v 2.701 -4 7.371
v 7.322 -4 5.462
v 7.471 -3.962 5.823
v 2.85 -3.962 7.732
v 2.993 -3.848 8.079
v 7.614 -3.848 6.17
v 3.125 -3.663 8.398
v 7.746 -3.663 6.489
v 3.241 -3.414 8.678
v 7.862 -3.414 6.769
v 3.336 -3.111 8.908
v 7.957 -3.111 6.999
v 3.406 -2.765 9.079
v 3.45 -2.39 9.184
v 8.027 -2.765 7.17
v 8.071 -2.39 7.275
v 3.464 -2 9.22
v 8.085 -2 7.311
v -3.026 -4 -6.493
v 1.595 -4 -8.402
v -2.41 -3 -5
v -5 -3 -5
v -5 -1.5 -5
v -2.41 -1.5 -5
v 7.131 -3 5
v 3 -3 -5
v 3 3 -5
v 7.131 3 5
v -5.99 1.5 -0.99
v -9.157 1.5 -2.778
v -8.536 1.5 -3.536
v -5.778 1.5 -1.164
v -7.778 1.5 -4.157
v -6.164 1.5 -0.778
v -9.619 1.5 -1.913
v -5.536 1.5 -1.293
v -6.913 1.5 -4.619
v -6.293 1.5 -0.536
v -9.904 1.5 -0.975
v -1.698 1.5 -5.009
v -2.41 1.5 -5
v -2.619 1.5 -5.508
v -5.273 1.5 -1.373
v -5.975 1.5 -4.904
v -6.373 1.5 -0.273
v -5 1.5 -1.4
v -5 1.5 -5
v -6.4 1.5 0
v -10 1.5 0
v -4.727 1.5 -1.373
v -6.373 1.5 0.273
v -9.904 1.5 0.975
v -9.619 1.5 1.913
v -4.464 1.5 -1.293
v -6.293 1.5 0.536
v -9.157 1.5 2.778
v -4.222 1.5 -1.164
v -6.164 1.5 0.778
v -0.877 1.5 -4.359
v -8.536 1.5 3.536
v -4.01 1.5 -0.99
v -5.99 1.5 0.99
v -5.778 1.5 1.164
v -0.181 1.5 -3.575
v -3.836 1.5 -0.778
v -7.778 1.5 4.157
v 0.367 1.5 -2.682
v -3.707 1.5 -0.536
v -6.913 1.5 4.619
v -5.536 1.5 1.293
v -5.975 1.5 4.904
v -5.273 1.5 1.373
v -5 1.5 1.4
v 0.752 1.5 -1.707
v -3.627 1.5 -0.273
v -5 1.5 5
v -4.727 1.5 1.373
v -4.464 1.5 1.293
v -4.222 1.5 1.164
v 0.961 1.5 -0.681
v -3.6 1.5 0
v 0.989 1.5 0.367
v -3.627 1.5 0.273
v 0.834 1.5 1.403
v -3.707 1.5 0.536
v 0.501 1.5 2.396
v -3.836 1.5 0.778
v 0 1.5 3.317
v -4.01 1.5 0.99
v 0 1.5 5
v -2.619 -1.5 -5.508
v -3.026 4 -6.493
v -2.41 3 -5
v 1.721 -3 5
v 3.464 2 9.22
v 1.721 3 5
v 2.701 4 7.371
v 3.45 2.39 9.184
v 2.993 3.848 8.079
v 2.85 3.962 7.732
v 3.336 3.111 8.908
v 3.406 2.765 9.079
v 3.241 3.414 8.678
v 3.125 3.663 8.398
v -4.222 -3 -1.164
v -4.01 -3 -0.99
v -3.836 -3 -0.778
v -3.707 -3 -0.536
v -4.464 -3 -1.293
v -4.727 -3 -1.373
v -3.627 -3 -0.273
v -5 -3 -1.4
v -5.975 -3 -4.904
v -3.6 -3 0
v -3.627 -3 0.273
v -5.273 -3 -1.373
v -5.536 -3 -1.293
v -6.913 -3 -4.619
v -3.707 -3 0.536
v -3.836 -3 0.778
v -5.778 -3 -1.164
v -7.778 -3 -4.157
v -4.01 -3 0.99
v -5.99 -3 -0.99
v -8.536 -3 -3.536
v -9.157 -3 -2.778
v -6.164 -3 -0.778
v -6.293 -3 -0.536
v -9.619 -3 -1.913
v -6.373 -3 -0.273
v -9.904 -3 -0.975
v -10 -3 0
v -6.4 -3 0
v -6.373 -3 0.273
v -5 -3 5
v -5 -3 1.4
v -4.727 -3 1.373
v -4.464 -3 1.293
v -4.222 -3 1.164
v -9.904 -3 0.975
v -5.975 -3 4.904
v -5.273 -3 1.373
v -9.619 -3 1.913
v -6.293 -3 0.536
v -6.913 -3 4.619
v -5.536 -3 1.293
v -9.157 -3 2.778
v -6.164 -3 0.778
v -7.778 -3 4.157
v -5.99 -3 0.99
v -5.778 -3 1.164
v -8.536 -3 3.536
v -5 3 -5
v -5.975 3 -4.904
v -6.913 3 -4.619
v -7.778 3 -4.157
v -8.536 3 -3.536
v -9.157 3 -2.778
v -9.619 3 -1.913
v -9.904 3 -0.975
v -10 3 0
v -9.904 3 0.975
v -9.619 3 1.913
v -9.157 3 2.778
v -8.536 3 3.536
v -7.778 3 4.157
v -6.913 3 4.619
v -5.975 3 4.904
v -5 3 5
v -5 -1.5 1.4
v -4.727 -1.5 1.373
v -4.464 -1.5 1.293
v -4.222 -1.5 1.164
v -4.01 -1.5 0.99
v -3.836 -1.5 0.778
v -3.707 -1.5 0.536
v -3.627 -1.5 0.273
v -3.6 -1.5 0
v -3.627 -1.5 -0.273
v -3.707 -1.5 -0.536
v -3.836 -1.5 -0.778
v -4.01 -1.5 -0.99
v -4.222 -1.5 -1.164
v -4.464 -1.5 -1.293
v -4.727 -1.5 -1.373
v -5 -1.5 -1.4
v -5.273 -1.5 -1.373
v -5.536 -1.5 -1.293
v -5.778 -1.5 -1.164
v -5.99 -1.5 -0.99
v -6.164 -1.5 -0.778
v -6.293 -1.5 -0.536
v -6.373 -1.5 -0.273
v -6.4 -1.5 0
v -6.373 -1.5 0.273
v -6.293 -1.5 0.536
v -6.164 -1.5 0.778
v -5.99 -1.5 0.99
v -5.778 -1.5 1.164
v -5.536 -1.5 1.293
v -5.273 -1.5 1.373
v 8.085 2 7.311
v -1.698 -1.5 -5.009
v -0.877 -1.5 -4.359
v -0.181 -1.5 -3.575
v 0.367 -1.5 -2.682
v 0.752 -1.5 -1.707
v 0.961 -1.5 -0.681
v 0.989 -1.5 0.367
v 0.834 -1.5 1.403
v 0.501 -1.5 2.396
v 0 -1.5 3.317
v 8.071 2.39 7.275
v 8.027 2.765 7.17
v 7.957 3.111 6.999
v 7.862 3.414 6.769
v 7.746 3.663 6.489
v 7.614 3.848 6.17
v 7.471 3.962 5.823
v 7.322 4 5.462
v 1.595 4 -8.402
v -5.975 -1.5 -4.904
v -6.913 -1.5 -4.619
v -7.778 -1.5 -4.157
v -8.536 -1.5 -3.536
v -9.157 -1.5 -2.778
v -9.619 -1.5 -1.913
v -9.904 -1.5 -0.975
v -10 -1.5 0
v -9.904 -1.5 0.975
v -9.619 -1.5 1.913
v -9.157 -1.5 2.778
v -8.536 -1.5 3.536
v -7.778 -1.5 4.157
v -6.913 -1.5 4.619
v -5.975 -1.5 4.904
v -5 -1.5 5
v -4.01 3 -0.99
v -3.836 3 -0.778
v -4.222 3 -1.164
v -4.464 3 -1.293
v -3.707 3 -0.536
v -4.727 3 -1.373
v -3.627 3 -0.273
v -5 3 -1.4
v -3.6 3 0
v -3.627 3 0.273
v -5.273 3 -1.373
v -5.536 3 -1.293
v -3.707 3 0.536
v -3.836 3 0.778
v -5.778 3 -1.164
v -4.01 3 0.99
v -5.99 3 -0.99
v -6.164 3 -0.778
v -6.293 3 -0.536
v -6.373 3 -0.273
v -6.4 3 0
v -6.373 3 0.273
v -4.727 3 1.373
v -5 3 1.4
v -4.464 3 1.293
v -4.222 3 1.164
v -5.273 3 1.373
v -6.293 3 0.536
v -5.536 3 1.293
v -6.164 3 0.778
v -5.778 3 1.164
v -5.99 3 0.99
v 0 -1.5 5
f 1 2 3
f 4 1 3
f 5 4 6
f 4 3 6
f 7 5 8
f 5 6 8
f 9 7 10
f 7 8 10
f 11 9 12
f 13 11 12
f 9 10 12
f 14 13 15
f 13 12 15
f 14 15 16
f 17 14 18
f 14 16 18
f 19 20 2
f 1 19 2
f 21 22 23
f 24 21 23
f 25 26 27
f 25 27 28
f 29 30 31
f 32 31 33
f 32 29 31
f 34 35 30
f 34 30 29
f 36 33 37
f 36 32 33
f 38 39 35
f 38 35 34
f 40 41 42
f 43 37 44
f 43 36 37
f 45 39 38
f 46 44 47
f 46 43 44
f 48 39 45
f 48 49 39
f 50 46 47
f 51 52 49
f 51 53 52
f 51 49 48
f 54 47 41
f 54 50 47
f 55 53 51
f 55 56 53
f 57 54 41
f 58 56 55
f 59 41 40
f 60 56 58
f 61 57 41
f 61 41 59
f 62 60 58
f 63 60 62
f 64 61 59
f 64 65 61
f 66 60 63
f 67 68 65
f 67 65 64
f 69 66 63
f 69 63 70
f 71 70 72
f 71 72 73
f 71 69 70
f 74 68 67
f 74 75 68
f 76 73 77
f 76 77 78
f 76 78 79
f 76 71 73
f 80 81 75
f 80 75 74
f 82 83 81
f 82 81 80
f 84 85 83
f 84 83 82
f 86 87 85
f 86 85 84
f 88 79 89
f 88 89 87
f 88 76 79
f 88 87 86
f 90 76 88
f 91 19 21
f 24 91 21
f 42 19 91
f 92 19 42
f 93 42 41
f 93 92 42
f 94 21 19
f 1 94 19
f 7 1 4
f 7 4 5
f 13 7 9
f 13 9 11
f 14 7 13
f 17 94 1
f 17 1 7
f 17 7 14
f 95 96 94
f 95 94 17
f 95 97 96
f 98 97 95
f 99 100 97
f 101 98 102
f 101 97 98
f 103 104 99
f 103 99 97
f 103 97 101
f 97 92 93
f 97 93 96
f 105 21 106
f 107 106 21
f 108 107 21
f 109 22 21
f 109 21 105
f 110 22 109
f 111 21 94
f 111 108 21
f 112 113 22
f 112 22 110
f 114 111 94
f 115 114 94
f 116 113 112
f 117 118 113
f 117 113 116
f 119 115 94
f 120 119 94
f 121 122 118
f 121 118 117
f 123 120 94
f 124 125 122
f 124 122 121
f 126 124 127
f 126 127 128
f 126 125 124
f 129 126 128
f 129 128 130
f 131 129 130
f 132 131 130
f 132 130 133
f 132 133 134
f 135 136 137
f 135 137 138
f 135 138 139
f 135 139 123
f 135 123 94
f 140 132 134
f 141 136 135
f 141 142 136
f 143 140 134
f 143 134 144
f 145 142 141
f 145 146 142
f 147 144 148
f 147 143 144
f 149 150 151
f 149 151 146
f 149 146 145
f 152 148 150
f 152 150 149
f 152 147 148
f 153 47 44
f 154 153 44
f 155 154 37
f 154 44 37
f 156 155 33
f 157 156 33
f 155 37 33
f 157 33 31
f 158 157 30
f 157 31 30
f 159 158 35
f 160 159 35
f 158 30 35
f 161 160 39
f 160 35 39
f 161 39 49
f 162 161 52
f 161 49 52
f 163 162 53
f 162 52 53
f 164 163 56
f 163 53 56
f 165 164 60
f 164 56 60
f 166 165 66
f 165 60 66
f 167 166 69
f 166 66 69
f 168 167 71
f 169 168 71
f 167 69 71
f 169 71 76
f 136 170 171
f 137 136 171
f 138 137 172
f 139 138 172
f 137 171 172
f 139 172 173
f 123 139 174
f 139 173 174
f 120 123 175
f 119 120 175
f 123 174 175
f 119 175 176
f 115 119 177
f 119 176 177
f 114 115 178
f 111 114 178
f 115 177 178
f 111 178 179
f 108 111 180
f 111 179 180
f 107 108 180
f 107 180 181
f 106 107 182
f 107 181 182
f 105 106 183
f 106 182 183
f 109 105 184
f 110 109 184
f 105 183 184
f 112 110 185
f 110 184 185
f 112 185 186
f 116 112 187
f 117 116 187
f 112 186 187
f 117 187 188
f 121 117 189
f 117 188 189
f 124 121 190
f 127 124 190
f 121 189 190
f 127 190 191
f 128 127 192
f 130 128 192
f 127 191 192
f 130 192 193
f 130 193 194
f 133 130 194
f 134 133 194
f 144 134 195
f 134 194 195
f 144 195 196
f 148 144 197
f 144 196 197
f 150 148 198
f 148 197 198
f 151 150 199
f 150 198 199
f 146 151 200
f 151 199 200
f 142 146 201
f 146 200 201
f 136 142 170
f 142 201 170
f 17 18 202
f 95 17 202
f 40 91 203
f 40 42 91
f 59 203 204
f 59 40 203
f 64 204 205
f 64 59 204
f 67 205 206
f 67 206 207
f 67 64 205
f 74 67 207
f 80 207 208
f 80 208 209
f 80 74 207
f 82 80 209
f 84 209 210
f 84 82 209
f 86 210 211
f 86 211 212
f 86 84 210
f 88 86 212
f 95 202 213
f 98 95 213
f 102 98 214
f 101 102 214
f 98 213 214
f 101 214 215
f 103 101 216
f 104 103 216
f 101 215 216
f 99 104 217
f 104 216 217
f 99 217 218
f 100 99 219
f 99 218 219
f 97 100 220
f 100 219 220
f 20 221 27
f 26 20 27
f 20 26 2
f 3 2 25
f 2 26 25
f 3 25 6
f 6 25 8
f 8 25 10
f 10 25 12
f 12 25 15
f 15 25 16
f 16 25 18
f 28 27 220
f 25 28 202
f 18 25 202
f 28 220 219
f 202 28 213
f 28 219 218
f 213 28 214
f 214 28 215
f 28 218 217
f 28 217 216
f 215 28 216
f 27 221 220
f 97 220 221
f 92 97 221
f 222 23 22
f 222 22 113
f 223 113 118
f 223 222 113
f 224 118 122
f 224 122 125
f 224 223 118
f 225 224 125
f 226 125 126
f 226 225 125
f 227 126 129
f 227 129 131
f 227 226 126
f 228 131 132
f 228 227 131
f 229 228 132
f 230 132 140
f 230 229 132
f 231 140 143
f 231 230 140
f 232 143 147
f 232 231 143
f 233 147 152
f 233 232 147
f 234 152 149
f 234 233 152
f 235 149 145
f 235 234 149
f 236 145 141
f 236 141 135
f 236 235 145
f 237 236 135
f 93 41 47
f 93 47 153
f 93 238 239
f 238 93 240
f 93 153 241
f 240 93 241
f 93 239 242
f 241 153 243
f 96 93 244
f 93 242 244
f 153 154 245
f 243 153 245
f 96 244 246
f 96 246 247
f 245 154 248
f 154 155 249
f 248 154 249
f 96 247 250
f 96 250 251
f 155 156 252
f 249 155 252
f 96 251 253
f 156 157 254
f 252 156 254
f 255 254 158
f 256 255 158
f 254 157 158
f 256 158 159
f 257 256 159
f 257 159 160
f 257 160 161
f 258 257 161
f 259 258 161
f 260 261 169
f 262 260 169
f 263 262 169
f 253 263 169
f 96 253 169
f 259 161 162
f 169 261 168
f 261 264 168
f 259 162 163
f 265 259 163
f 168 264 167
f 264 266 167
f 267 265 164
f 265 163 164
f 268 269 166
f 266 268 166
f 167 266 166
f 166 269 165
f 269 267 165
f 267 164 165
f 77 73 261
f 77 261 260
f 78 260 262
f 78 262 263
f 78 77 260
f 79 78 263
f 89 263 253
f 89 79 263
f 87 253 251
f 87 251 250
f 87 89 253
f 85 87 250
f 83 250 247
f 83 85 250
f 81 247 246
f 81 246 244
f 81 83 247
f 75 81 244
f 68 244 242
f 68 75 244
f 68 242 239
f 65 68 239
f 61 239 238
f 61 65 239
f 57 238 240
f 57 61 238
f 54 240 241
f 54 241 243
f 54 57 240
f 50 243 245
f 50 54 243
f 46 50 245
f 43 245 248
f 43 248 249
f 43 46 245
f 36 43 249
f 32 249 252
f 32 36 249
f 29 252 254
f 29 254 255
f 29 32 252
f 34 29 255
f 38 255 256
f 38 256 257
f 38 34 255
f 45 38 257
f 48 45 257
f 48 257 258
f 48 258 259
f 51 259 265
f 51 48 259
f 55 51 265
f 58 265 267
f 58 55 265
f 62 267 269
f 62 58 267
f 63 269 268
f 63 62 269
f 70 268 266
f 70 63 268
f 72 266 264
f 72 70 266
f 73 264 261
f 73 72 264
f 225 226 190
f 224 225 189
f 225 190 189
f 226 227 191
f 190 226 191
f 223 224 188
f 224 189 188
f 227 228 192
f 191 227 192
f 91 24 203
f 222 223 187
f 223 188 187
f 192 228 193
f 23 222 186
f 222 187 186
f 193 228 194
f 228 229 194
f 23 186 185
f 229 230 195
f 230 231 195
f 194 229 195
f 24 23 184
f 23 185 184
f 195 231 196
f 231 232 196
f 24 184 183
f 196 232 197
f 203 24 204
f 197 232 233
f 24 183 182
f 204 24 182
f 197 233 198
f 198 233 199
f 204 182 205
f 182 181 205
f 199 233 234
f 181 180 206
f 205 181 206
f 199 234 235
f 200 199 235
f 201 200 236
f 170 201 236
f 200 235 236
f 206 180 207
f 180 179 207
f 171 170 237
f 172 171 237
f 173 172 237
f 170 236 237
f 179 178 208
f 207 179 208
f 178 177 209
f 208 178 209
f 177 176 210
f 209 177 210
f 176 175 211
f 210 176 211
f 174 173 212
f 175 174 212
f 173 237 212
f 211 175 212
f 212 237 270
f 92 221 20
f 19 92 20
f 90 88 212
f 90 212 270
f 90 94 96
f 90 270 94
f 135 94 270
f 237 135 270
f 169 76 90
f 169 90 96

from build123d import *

# Parameters (mm, degrees)
BOSS_EXTRUDE1_DEPTH          = 5
SKETCH2_R                    = 5
SKETCH2_R_2                  = 1.4
BOSS_EXTRUDE2_DEPTH          = 1.5
BOSS_EXTRUDE3_REACH          = 13.576
SKETCH4_W                    = 10
SKETCH4_H                    = 1.5
SKETCH6_R                    = 5
SKETCH6_R_2                  = 1.4
BOSS_EXTRUDE4_DEPTH          = 1.5
BOSS_EXTRUDE5_REACH          = 13.576
SKETCH5_W                    = 10
SKETCH5_H                    = 1.5
SCHIZZO1_W                   = 10
SCHIZZO1_H                   = 6
ESTRUSIONE_ESTRUSIONE2_DEPTH = 11
TAGLIO_ESTRUSIONE1_DEPTH     = 11
ESTRUSIONE_ESTRUSIONE3_DEPTH = 5
SCHIZZO4_R                   = 6
TAGLIO_ESTRUSIONE2_DEPTH     = 3


with BuildPart() as part:
    # Sketch1 → Boss-Extrude1 (new, symmetric)
    with BuildSketch(Plane.XY):
        with BuildLine():
            Line((0, 3), (0, 1.5))
            ThreePointArc((0, 1.5), (1.5, 0), (0, -1.5))
            Line((0, -1.5), (0, -3))
            ThreePointArc((0, -3), (3, 0), (0, 3))
        make_face()
    extrude(amount=BOSS_EXTRUDE1_DEPTH, both=True)


with BuildPart() as body_2:
    # Sketch2 → Boss-Extrude2 (new body)
    with BuildSketch(Plane(origin=(0, 1.5, 0), x_dir=(1, 0, 0), z_dir=(0, 1, 0))):
        with Locations(Location((-5, 0, 0), (0, 0, 270))):
            Circle(SKETCH2_R)
        with Locations(Location((-5, 0, 0), (0, 0, 270))):
            Circle(SKETCH2_R_2, mode=Mode.SUBTRACT)
    extrude(amount=BOSS_EXTRUDE2_DEPTH)

    # Sketch4 → Boss-Extrude3 (add, up to next)
    with BuildSketch(Plane.ZY, mode=Mode.PRIVATE) as boss_extrude3_sk1:
        with Locations((0, 2.25)):
            Rectangle(SKETCH4_W, SKETCH4_H)
    boss_extrude3_tool1 = extrude(boss_extrude3_sk1.sketch, amount=BOSS_EXTRUDE3_REACH, mode=Mode.PRIVATE) - body_2.part

    add(part.part)  # Boss-Extrude3 merges part
    add(boss_extrude3_tool1.solids().sort_by_distance((0, 2.25, 0))[0])
    add(boss_extrude3_tool1.solids().sort_by_distance((0, 2.25, 0))[1])


with BuildPart() as body_2_2:
    # Sketch6 → Boss-Extrude4 (new body)
    with BuildSketch(Plane(origin=(0, -1.5, 0), x_dir=(1, 0, 0), z_dir=(0, 1, 0))):
        with Locations(Location((-5, 0, 0), (0, 0, 270))):
            Circle(SKETCH6_R)
        with Locations(Location((-5, 0, 0), (0, 0, 270))):
            Circle(SKETCH6_R_2, mode=Mode.SUBTRACT)
    extrude(amount=-BOSS_EXTRUDE4_DEPTH)

    # Sketch5 → Boss-Extrude5 (add, up to next)
    with BuildSketch(Plane.ZY, mode=Mode.PRIVATE) as boss_extrude5_sk1:
        with Locations((0, -2.25)):
            Rectangle(SKETCH5_W, SKETCH5_H)
    boss_extrude5_tool1 = extrude(boss_extrude5_sk1.sketch, amount=BOSS_EXTRUDE5_REACH, mode=Mode.PRIVATE) - body_2_2.part

    add(body_2.part)  # Boss-Extrude5 merges body 2
    add(boss_extrude5_tool1.solids().sort_by_distance((0, -2.25, 0))[0])
    add(boss_extrude5_tool1.solids().sort_by_distance((0, -2.25, 0))[1])

    # Schizzo1 → Estrusione-Estrusione2 (add)
    with BuildSketch(Plane.ZY):
        Rectangle(SCHIZZO1_W, SCHIZZO1_H)
    extrude(amount=-ESTRUSIONE_ESTRUSIONE2_DEPTH)

    # Schizzo2 → Taglio-Estrusione1 (cut)
    with BuildSketch(Plane.XZ.offset(3)):
        Polygon((3, -5), (7.130949903, 5), (11, 5), (13.561973645, 5), (13.561973645, -5), align=None)
    extrude(amount=-TAGLIO_ESTRUSIONE1_DEPTH, mode=Mode.SUBTRACT)

    # Schizzo3 → Estrusione-Estrusione3 (add)
    with BuildSketch(Plane(origin=(4.327071195, 0, -1.787491434), x_dir=(-0.3818008251213657, 0, -0.9242446266744776), z_dir=(0.9242446266744775, 0, -0.38180082512136565))):
        with BuildLine():
            Line((-7.84382569, 4), (7.15617431, 4))
            Line((7.15617431, 4), (7.15617431, -4))
            Line((7.15617431, -4), (-7.84382569, -4))
            ThreePointArc((-7.84382569, -4), (-9.258039253, -3.414213562), (-9.84382569, -2))
            Line((-9.84382569, -2), (-9.84382569, 2))
            ThreePointArc((-9.84382569, 2), (-9.258039253, 3.414213562), (-7.84382569, 4))
        make_face()
    extrude(amount=-ESTRUSIONE_ESTRUSIONE3_DEPTH)

    # Schizzo4 → Taglio-Estrusione2 (cut)
    with BuildSketch(Plane.XZ.offset(-1.5)):
        with Locations((-5, 0)):
            Circle(SCHIZZO4_R)
    extrude(amount=TAGLIO_ESTRUSIONE2_DEPTH, mode=Mode.SUBTRACT)


solid = body_2_2.part
